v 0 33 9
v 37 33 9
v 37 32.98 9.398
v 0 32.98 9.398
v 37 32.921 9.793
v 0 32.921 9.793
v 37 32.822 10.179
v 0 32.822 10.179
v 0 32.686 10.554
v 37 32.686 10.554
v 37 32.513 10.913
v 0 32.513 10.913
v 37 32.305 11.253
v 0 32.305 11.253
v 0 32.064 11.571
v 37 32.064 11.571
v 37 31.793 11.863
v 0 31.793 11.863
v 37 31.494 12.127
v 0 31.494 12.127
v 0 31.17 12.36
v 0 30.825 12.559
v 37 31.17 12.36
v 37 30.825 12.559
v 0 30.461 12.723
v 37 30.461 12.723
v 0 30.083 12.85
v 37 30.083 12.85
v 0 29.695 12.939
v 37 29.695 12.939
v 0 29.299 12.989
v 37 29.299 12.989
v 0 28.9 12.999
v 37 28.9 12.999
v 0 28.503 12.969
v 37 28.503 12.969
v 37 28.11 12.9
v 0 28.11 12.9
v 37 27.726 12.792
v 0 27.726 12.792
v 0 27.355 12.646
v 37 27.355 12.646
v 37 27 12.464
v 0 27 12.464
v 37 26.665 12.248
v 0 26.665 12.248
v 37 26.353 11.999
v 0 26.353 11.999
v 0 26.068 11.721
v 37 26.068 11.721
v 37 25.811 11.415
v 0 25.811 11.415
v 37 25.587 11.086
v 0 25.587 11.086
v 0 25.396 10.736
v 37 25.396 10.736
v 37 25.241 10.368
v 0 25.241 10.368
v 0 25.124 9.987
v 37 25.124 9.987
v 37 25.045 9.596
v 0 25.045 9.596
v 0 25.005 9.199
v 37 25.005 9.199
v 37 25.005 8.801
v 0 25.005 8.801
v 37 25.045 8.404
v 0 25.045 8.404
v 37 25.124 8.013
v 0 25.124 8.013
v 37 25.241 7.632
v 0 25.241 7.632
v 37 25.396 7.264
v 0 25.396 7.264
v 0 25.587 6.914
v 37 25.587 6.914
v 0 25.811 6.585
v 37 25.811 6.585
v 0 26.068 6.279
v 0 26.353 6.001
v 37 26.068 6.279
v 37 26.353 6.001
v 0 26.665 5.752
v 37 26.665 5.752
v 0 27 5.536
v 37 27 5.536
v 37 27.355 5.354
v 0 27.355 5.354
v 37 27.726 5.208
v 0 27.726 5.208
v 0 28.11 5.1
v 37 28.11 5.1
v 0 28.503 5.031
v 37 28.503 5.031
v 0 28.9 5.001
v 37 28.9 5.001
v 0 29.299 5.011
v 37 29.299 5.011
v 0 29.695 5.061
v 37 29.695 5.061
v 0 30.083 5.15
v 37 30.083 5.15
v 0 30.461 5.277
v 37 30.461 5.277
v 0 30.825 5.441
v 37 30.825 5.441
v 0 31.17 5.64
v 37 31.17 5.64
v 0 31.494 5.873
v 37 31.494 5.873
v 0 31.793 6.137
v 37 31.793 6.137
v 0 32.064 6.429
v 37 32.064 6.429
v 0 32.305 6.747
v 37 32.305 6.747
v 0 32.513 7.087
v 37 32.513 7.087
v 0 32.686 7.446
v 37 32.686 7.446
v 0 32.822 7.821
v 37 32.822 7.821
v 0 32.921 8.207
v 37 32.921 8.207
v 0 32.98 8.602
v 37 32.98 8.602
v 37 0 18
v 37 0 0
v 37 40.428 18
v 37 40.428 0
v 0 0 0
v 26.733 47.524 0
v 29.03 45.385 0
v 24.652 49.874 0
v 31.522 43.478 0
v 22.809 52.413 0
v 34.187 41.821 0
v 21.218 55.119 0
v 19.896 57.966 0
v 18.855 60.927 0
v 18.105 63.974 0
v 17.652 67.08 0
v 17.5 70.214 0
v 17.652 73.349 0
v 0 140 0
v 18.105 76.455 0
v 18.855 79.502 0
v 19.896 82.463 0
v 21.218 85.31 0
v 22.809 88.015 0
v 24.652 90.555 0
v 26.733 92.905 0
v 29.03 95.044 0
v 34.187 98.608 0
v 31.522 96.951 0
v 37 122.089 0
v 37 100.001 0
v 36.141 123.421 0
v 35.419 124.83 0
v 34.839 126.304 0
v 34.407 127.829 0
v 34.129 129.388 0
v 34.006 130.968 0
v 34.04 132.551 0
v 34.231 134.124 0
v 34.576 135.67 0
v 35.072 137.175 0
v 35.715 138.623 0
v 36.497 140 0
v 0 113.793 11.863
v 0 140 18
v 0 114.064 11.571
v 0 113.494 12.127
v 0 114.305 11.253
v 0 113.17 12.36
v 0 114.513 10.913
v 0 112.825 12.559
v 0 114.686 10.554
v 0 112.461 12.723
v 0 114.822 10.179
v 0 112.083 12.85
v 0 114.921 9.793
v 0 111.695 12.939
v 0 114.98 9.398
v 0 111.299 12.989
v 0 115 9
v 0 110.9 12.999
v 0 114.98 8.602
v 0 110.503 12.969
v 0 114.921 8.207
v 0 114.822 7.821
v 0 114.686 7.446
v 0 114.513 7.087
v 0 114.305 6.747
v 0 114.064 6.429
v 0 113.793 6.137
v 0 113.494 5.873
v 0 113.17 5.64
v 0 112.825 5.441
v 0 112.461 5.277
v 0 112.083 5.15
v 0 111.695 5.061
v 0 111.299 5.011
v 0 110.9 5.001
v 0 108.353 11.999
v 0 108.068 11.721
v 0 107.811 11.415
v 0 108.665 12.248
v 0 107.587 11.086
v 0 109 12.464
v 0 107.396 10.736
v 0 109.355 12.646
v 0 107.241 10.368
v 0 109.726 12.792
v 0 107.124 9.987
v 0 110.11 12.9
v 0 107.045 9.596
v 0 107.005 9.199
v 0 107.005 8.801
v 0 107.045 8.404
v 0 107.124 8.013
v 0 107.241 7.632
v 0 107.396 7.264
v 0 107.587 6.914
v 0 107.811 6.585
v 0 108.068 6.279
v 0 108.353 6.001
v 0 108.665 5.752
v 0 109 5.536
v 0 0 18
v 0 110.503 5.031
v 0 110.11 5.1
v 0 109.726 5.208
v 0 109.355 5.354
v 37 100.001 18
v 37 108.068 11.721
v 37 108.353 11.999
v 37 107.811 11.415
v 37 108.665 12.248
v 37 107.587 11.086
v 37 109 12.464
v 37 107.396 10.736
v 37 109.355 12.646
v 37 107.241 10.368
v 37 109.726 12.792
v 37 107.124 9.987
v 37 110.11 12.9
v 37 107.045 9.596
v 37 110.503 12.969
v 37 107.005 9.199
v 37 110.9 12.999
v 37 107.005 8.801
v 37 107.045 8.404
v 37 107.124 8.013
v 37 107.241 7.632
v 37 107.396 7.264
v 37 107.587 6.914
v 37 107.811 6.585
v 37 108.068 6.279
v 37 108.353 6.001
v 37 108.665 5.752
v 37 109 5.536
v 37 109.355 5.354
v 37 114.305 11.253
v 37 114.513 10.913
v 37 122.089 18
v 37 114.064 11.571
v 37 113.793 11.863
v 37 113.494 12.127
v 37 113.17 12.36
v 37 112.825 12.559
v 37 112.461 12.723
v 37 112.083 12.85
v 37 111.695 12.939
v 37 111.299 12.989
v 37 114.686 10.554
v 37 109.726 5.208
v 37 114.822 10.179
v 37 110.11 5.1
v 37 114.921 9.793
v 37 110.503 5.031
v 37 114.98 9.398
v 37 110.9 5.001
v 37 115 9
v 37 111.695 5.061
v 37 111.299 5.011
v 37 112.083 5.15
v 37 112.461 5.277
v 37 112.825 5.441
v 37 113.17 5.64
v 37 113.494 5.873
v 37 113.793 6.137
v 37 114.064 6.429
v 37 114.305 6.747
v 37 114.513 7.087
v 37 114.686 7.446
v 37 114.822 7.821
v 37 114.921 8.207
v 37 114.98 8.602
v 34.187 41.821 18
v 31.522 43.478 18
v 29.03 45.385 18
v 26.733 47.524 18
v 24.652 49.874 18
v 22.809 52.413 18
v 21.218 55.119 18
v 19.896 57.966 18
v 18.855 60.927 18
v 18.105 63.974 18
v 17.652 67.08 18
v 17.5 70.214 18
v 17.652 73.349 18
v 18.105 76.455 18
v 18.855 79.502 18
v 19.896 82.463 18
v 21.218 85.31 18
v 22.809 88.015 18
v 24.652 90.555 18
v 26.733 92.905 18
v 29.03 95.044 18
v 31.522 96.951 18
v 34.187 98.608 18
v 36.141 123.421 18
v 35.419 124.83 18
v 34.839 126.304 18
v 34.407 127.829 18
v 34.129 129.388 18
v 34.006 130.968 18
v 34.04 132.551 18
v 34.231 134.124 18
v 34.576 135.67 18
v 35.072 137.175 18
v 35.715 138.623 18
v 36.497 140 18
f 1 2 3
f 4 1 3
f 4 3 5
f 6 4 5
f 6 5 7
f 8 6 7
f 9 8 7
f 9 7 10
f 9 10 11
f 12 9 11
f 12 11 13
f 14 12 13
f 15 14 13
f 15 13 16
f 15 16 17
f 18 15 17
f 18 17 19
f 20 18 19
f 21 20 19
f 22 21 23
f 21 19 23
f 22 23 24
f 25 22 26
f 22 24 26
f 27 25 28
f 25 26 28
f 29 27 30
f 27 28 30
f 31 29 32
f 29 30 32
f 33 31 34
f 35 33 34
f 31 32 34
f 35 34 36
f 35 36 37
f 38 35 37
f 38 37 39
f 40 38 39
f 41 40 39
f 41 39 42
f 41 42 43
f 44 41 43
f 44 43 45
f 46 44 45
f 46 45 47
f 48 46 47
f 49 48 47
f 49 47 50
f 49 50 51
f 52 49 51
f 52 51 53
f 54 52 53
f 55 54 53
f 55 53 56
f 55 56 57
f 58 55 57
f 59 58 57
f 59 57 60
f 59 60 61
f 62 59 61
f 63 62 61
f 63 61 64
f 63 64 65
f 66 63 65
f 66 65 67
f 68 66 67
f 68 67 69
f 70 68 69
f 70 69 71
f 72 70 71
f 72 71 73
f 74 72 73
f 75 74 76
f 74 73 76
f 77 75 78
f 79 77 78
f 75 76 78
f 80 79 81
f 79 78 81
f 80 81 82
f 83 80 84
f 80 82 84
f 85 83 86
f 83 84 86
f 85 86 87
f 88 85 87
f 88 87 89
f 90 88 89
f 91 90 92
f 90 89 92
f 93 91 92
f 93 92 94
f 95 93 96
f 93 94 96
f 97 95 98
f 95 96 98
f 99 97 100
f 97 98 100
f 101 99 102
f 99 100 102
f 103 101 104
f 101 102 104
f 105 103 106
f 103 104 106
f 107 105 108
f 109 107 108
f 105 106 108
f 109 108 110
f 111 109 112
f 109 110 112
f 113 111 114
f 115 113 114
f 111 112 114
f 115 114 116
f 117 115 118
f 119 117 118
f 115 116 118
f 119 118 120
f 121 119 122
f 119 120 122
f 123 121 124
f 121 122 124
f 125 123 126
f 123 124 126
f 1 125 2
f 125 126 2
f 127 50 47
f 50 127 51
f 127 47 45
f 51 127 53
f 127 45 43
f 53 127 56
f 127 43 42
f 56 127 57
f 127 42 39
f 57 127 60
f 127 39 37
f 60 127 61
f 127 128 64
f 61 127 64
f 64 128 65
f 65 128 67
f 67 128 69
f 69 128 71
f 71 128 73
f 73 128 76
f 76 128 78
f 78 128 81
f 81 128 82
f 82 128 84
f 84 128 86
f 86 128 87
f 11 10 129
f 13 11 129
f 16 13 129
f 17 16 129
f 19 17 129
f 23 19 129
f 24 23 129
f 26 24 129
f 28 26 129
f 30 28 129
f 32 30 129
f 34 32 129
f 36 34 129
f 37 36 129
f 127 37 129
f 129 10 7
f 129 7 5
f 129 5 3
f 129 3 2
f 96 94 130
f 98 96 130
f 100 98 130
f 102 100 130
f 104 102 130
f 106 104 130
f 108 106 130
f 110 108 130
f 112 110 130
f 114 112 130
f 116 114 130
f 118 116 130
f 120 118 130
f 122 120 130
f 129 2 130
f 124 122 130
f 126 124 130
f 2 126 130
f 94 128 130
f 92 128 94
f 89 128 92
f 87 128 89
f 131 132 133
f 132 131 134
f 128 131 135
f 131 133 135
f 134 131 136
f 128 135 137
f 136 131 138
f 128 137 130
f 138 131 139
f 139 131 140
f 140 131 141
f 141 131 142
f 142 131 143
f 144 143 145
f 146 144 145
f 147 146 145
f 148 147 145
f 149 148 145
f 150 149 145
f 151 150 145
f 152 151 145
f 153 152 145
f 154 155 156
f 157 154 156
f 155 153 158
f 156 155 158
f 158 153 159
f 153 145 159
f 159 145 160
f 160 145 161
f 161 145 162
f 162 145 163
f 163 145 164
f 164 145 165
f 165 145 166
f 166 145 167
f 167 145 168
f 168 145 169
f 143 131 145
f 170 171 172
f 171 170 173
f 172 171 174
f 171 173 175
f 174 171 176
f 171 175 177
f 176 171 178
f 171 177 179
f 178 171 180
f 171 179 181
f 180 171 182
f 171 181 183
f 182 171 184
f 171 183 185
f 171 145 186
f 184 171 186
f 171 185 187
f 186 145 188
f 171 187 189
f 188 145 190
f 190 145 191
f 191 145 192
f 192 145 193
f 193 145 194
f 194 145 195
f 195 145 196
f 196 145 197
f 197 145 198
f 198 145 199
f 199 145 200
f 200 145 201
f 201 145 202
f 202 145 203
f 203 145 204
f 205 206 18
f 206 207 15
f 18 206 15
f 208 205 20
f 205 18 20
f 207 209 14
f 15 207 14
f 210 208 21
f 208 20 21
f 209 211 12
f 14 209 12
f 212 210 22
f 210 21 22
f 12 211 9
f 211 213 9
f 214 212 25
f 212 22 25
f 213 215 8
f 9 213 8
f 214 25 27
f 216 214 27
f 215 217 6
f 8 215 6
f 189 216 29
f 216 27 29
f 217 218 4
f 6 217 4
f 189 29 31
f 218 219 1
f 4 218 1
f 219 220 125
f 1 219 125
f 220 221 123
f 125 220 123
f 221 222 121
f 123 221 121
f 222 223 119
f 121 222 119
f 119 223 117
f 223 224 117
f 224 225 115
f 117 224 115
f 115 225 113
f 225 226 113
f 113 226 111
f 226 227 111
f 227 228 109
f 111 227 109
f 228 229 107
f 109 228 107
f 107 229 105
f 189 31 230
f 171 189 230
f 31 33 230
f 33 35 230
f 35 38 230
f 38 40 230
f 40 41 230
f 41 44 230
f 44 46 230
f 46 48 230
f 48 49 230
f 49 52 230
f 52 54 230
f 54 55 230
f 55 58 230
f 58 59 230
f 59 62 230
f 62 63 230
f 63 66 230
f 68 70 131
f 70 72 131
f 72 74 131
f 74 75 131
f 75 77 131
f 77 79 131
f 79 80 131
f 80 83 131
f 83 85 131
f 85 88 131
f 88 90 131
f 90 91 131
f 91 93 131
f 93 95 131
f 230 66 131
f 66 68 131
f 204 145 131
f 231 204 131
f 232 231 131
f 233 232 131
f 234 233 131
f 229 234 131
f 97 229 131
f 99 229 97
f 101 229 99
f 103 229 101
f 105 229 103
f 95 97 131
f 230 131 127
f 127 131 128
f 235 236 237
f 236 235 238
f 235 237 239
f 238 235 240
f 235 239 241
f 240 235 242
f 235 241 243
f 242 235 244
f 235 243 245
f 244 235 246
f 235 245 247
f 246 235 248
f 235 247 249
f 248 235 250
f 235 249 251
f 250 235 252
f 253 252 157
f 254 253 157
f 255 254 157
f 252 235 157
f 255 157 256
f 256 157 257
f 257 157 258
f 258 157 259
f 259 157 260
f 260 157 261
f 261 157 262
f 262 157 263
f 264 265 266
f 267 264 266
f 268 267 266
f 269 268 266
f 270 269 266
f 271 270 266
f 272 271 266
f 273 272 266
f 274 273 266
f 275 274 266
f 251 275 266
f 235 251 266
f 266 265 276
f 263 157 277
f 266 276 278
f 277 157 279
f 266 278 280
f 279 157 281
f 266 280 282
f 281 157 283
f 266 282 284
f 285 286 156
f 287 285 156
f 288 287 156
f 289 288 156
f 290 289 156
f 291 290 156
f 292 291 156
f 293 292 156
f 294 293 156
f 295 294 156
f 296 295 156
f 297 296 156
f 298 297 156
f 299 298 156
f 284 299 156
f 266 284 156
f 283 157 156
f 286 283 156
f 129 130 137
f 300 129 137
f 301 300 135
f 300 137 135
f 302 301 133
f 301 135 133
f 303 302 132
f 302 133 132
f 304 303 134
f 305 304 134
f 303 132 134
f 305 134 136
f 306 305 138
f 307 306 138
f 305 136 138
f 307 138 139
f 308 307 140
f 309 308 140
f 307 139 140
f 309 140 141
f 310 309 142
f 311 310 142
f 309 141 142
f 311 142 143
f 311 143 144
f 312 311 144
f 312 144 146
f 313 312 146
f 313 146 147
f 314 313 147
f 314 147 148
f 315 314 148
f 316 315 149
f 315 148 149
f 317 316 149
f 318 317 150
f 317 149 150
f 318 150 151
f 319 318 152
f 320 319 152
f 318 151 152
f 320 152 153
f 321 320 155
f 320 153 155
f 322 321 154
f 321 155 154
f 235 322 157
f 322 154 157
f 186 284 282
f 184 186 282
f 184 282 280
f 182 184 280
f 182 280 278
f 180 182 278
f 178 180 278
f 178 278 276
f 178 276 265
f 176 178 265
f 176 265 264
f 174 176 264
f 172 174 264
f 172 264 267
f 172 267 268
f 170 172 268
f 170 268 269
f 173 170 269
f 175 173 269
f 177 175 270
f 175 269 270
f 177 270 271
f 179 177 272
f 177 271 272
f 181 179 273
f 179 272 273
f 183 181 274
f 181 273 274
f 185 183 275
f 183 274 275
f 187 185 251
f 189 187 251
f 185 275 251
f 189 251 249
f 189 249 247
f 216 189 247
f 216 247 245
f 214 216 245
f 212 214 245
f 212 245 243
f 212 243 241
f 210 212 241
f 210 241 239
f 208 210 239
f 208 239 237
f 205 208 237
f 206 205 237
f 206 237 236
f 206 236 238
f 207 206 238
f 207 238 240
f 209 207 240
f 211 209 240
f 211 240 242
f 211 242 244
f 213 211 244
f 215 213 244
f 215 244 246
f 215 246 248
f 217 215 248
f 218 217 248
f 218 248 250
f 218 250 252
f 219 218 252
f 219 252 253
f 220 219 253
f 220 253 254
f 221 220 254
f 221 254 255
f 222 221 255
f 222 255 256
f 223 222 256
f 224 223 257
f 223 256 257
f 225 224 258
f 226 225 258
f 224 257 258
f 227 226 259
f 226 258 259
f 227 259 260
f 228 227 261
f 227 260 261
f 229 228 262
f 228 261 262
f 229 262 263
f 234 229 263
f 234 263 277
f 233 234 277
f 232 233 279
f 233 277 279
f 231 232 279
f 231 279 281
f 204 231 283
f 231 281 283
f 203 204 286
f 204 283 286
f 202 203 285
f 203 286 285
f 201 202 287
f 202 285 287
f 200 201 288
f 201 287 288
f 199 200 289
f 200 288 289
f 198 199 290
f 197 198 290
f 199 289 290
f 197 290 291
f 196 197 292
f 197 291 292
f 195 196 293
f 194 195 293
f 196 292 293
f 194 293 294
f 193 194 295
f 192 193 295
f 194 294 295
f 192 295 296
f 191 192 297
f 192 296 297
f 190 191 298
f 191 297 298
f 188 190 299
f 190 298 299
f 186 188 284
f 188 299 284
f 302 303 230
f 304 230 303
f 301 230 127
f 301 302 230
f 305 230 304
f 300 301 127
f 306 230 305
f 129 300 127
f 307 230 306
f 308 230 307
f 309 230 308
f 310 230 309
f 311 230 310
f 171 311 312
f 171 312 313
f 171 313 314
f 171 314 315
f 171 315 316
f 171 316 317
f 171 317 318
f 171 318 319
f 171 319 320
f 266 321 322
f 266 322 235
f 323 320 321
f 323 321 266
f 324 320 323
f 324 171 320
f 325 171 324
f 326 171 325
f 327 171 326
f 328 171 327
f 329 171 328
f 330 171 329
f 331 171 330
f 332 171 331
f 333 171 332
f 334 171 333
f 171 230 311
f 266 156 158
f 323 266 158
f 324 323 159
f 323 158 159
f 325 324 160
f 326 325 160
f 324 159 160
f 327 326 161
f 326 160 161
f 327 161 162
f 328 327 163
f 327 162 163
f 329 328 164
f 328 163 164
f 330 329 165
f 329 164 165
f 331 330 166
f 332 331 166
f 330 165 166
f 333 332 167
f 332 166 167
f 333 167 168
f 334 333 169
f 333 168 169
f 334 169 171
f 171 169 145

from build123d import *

# Parameters (mm, degrees)
F1_DEPTH = 18
F2_R     = 4
F3_DEPTH = 37.001


with BuildPart() as f1:
    # F0 (on Top) → F1 (new body)
    with BuildSketch(Plane.XY):
        with BuildLine():
            Line((0, 140), (0, 0))
            Line((0, 0), (37, 0))
            Line((37, 0), (37, 40.427738))
            ThreePointArc((37, 40.427738), (17.5, 70.21448), (37, 100.001222))
            Line((37, 100.001222), (37, 122.08924))
            ThreePointArc((37, 122.08924), (34.006301, 130.967637), (36.497201, 140))
            Line((36.497201, 140), (0, 140))
        make_face()
    extrude(amount=F1_DEPTH)

    # F2 (on face) → F3 (cut, through all)
    with BuildSketch(Plane.YZ.offset(37)):
        with Locations((111, 9)):
            Circle(F2_R)
        with Locations((29, 9)):
            Circle(F2_R)
    extrude(amount=-F3_DEPTH, mode=Mode.SUBTRACT)


solid = f1.part
